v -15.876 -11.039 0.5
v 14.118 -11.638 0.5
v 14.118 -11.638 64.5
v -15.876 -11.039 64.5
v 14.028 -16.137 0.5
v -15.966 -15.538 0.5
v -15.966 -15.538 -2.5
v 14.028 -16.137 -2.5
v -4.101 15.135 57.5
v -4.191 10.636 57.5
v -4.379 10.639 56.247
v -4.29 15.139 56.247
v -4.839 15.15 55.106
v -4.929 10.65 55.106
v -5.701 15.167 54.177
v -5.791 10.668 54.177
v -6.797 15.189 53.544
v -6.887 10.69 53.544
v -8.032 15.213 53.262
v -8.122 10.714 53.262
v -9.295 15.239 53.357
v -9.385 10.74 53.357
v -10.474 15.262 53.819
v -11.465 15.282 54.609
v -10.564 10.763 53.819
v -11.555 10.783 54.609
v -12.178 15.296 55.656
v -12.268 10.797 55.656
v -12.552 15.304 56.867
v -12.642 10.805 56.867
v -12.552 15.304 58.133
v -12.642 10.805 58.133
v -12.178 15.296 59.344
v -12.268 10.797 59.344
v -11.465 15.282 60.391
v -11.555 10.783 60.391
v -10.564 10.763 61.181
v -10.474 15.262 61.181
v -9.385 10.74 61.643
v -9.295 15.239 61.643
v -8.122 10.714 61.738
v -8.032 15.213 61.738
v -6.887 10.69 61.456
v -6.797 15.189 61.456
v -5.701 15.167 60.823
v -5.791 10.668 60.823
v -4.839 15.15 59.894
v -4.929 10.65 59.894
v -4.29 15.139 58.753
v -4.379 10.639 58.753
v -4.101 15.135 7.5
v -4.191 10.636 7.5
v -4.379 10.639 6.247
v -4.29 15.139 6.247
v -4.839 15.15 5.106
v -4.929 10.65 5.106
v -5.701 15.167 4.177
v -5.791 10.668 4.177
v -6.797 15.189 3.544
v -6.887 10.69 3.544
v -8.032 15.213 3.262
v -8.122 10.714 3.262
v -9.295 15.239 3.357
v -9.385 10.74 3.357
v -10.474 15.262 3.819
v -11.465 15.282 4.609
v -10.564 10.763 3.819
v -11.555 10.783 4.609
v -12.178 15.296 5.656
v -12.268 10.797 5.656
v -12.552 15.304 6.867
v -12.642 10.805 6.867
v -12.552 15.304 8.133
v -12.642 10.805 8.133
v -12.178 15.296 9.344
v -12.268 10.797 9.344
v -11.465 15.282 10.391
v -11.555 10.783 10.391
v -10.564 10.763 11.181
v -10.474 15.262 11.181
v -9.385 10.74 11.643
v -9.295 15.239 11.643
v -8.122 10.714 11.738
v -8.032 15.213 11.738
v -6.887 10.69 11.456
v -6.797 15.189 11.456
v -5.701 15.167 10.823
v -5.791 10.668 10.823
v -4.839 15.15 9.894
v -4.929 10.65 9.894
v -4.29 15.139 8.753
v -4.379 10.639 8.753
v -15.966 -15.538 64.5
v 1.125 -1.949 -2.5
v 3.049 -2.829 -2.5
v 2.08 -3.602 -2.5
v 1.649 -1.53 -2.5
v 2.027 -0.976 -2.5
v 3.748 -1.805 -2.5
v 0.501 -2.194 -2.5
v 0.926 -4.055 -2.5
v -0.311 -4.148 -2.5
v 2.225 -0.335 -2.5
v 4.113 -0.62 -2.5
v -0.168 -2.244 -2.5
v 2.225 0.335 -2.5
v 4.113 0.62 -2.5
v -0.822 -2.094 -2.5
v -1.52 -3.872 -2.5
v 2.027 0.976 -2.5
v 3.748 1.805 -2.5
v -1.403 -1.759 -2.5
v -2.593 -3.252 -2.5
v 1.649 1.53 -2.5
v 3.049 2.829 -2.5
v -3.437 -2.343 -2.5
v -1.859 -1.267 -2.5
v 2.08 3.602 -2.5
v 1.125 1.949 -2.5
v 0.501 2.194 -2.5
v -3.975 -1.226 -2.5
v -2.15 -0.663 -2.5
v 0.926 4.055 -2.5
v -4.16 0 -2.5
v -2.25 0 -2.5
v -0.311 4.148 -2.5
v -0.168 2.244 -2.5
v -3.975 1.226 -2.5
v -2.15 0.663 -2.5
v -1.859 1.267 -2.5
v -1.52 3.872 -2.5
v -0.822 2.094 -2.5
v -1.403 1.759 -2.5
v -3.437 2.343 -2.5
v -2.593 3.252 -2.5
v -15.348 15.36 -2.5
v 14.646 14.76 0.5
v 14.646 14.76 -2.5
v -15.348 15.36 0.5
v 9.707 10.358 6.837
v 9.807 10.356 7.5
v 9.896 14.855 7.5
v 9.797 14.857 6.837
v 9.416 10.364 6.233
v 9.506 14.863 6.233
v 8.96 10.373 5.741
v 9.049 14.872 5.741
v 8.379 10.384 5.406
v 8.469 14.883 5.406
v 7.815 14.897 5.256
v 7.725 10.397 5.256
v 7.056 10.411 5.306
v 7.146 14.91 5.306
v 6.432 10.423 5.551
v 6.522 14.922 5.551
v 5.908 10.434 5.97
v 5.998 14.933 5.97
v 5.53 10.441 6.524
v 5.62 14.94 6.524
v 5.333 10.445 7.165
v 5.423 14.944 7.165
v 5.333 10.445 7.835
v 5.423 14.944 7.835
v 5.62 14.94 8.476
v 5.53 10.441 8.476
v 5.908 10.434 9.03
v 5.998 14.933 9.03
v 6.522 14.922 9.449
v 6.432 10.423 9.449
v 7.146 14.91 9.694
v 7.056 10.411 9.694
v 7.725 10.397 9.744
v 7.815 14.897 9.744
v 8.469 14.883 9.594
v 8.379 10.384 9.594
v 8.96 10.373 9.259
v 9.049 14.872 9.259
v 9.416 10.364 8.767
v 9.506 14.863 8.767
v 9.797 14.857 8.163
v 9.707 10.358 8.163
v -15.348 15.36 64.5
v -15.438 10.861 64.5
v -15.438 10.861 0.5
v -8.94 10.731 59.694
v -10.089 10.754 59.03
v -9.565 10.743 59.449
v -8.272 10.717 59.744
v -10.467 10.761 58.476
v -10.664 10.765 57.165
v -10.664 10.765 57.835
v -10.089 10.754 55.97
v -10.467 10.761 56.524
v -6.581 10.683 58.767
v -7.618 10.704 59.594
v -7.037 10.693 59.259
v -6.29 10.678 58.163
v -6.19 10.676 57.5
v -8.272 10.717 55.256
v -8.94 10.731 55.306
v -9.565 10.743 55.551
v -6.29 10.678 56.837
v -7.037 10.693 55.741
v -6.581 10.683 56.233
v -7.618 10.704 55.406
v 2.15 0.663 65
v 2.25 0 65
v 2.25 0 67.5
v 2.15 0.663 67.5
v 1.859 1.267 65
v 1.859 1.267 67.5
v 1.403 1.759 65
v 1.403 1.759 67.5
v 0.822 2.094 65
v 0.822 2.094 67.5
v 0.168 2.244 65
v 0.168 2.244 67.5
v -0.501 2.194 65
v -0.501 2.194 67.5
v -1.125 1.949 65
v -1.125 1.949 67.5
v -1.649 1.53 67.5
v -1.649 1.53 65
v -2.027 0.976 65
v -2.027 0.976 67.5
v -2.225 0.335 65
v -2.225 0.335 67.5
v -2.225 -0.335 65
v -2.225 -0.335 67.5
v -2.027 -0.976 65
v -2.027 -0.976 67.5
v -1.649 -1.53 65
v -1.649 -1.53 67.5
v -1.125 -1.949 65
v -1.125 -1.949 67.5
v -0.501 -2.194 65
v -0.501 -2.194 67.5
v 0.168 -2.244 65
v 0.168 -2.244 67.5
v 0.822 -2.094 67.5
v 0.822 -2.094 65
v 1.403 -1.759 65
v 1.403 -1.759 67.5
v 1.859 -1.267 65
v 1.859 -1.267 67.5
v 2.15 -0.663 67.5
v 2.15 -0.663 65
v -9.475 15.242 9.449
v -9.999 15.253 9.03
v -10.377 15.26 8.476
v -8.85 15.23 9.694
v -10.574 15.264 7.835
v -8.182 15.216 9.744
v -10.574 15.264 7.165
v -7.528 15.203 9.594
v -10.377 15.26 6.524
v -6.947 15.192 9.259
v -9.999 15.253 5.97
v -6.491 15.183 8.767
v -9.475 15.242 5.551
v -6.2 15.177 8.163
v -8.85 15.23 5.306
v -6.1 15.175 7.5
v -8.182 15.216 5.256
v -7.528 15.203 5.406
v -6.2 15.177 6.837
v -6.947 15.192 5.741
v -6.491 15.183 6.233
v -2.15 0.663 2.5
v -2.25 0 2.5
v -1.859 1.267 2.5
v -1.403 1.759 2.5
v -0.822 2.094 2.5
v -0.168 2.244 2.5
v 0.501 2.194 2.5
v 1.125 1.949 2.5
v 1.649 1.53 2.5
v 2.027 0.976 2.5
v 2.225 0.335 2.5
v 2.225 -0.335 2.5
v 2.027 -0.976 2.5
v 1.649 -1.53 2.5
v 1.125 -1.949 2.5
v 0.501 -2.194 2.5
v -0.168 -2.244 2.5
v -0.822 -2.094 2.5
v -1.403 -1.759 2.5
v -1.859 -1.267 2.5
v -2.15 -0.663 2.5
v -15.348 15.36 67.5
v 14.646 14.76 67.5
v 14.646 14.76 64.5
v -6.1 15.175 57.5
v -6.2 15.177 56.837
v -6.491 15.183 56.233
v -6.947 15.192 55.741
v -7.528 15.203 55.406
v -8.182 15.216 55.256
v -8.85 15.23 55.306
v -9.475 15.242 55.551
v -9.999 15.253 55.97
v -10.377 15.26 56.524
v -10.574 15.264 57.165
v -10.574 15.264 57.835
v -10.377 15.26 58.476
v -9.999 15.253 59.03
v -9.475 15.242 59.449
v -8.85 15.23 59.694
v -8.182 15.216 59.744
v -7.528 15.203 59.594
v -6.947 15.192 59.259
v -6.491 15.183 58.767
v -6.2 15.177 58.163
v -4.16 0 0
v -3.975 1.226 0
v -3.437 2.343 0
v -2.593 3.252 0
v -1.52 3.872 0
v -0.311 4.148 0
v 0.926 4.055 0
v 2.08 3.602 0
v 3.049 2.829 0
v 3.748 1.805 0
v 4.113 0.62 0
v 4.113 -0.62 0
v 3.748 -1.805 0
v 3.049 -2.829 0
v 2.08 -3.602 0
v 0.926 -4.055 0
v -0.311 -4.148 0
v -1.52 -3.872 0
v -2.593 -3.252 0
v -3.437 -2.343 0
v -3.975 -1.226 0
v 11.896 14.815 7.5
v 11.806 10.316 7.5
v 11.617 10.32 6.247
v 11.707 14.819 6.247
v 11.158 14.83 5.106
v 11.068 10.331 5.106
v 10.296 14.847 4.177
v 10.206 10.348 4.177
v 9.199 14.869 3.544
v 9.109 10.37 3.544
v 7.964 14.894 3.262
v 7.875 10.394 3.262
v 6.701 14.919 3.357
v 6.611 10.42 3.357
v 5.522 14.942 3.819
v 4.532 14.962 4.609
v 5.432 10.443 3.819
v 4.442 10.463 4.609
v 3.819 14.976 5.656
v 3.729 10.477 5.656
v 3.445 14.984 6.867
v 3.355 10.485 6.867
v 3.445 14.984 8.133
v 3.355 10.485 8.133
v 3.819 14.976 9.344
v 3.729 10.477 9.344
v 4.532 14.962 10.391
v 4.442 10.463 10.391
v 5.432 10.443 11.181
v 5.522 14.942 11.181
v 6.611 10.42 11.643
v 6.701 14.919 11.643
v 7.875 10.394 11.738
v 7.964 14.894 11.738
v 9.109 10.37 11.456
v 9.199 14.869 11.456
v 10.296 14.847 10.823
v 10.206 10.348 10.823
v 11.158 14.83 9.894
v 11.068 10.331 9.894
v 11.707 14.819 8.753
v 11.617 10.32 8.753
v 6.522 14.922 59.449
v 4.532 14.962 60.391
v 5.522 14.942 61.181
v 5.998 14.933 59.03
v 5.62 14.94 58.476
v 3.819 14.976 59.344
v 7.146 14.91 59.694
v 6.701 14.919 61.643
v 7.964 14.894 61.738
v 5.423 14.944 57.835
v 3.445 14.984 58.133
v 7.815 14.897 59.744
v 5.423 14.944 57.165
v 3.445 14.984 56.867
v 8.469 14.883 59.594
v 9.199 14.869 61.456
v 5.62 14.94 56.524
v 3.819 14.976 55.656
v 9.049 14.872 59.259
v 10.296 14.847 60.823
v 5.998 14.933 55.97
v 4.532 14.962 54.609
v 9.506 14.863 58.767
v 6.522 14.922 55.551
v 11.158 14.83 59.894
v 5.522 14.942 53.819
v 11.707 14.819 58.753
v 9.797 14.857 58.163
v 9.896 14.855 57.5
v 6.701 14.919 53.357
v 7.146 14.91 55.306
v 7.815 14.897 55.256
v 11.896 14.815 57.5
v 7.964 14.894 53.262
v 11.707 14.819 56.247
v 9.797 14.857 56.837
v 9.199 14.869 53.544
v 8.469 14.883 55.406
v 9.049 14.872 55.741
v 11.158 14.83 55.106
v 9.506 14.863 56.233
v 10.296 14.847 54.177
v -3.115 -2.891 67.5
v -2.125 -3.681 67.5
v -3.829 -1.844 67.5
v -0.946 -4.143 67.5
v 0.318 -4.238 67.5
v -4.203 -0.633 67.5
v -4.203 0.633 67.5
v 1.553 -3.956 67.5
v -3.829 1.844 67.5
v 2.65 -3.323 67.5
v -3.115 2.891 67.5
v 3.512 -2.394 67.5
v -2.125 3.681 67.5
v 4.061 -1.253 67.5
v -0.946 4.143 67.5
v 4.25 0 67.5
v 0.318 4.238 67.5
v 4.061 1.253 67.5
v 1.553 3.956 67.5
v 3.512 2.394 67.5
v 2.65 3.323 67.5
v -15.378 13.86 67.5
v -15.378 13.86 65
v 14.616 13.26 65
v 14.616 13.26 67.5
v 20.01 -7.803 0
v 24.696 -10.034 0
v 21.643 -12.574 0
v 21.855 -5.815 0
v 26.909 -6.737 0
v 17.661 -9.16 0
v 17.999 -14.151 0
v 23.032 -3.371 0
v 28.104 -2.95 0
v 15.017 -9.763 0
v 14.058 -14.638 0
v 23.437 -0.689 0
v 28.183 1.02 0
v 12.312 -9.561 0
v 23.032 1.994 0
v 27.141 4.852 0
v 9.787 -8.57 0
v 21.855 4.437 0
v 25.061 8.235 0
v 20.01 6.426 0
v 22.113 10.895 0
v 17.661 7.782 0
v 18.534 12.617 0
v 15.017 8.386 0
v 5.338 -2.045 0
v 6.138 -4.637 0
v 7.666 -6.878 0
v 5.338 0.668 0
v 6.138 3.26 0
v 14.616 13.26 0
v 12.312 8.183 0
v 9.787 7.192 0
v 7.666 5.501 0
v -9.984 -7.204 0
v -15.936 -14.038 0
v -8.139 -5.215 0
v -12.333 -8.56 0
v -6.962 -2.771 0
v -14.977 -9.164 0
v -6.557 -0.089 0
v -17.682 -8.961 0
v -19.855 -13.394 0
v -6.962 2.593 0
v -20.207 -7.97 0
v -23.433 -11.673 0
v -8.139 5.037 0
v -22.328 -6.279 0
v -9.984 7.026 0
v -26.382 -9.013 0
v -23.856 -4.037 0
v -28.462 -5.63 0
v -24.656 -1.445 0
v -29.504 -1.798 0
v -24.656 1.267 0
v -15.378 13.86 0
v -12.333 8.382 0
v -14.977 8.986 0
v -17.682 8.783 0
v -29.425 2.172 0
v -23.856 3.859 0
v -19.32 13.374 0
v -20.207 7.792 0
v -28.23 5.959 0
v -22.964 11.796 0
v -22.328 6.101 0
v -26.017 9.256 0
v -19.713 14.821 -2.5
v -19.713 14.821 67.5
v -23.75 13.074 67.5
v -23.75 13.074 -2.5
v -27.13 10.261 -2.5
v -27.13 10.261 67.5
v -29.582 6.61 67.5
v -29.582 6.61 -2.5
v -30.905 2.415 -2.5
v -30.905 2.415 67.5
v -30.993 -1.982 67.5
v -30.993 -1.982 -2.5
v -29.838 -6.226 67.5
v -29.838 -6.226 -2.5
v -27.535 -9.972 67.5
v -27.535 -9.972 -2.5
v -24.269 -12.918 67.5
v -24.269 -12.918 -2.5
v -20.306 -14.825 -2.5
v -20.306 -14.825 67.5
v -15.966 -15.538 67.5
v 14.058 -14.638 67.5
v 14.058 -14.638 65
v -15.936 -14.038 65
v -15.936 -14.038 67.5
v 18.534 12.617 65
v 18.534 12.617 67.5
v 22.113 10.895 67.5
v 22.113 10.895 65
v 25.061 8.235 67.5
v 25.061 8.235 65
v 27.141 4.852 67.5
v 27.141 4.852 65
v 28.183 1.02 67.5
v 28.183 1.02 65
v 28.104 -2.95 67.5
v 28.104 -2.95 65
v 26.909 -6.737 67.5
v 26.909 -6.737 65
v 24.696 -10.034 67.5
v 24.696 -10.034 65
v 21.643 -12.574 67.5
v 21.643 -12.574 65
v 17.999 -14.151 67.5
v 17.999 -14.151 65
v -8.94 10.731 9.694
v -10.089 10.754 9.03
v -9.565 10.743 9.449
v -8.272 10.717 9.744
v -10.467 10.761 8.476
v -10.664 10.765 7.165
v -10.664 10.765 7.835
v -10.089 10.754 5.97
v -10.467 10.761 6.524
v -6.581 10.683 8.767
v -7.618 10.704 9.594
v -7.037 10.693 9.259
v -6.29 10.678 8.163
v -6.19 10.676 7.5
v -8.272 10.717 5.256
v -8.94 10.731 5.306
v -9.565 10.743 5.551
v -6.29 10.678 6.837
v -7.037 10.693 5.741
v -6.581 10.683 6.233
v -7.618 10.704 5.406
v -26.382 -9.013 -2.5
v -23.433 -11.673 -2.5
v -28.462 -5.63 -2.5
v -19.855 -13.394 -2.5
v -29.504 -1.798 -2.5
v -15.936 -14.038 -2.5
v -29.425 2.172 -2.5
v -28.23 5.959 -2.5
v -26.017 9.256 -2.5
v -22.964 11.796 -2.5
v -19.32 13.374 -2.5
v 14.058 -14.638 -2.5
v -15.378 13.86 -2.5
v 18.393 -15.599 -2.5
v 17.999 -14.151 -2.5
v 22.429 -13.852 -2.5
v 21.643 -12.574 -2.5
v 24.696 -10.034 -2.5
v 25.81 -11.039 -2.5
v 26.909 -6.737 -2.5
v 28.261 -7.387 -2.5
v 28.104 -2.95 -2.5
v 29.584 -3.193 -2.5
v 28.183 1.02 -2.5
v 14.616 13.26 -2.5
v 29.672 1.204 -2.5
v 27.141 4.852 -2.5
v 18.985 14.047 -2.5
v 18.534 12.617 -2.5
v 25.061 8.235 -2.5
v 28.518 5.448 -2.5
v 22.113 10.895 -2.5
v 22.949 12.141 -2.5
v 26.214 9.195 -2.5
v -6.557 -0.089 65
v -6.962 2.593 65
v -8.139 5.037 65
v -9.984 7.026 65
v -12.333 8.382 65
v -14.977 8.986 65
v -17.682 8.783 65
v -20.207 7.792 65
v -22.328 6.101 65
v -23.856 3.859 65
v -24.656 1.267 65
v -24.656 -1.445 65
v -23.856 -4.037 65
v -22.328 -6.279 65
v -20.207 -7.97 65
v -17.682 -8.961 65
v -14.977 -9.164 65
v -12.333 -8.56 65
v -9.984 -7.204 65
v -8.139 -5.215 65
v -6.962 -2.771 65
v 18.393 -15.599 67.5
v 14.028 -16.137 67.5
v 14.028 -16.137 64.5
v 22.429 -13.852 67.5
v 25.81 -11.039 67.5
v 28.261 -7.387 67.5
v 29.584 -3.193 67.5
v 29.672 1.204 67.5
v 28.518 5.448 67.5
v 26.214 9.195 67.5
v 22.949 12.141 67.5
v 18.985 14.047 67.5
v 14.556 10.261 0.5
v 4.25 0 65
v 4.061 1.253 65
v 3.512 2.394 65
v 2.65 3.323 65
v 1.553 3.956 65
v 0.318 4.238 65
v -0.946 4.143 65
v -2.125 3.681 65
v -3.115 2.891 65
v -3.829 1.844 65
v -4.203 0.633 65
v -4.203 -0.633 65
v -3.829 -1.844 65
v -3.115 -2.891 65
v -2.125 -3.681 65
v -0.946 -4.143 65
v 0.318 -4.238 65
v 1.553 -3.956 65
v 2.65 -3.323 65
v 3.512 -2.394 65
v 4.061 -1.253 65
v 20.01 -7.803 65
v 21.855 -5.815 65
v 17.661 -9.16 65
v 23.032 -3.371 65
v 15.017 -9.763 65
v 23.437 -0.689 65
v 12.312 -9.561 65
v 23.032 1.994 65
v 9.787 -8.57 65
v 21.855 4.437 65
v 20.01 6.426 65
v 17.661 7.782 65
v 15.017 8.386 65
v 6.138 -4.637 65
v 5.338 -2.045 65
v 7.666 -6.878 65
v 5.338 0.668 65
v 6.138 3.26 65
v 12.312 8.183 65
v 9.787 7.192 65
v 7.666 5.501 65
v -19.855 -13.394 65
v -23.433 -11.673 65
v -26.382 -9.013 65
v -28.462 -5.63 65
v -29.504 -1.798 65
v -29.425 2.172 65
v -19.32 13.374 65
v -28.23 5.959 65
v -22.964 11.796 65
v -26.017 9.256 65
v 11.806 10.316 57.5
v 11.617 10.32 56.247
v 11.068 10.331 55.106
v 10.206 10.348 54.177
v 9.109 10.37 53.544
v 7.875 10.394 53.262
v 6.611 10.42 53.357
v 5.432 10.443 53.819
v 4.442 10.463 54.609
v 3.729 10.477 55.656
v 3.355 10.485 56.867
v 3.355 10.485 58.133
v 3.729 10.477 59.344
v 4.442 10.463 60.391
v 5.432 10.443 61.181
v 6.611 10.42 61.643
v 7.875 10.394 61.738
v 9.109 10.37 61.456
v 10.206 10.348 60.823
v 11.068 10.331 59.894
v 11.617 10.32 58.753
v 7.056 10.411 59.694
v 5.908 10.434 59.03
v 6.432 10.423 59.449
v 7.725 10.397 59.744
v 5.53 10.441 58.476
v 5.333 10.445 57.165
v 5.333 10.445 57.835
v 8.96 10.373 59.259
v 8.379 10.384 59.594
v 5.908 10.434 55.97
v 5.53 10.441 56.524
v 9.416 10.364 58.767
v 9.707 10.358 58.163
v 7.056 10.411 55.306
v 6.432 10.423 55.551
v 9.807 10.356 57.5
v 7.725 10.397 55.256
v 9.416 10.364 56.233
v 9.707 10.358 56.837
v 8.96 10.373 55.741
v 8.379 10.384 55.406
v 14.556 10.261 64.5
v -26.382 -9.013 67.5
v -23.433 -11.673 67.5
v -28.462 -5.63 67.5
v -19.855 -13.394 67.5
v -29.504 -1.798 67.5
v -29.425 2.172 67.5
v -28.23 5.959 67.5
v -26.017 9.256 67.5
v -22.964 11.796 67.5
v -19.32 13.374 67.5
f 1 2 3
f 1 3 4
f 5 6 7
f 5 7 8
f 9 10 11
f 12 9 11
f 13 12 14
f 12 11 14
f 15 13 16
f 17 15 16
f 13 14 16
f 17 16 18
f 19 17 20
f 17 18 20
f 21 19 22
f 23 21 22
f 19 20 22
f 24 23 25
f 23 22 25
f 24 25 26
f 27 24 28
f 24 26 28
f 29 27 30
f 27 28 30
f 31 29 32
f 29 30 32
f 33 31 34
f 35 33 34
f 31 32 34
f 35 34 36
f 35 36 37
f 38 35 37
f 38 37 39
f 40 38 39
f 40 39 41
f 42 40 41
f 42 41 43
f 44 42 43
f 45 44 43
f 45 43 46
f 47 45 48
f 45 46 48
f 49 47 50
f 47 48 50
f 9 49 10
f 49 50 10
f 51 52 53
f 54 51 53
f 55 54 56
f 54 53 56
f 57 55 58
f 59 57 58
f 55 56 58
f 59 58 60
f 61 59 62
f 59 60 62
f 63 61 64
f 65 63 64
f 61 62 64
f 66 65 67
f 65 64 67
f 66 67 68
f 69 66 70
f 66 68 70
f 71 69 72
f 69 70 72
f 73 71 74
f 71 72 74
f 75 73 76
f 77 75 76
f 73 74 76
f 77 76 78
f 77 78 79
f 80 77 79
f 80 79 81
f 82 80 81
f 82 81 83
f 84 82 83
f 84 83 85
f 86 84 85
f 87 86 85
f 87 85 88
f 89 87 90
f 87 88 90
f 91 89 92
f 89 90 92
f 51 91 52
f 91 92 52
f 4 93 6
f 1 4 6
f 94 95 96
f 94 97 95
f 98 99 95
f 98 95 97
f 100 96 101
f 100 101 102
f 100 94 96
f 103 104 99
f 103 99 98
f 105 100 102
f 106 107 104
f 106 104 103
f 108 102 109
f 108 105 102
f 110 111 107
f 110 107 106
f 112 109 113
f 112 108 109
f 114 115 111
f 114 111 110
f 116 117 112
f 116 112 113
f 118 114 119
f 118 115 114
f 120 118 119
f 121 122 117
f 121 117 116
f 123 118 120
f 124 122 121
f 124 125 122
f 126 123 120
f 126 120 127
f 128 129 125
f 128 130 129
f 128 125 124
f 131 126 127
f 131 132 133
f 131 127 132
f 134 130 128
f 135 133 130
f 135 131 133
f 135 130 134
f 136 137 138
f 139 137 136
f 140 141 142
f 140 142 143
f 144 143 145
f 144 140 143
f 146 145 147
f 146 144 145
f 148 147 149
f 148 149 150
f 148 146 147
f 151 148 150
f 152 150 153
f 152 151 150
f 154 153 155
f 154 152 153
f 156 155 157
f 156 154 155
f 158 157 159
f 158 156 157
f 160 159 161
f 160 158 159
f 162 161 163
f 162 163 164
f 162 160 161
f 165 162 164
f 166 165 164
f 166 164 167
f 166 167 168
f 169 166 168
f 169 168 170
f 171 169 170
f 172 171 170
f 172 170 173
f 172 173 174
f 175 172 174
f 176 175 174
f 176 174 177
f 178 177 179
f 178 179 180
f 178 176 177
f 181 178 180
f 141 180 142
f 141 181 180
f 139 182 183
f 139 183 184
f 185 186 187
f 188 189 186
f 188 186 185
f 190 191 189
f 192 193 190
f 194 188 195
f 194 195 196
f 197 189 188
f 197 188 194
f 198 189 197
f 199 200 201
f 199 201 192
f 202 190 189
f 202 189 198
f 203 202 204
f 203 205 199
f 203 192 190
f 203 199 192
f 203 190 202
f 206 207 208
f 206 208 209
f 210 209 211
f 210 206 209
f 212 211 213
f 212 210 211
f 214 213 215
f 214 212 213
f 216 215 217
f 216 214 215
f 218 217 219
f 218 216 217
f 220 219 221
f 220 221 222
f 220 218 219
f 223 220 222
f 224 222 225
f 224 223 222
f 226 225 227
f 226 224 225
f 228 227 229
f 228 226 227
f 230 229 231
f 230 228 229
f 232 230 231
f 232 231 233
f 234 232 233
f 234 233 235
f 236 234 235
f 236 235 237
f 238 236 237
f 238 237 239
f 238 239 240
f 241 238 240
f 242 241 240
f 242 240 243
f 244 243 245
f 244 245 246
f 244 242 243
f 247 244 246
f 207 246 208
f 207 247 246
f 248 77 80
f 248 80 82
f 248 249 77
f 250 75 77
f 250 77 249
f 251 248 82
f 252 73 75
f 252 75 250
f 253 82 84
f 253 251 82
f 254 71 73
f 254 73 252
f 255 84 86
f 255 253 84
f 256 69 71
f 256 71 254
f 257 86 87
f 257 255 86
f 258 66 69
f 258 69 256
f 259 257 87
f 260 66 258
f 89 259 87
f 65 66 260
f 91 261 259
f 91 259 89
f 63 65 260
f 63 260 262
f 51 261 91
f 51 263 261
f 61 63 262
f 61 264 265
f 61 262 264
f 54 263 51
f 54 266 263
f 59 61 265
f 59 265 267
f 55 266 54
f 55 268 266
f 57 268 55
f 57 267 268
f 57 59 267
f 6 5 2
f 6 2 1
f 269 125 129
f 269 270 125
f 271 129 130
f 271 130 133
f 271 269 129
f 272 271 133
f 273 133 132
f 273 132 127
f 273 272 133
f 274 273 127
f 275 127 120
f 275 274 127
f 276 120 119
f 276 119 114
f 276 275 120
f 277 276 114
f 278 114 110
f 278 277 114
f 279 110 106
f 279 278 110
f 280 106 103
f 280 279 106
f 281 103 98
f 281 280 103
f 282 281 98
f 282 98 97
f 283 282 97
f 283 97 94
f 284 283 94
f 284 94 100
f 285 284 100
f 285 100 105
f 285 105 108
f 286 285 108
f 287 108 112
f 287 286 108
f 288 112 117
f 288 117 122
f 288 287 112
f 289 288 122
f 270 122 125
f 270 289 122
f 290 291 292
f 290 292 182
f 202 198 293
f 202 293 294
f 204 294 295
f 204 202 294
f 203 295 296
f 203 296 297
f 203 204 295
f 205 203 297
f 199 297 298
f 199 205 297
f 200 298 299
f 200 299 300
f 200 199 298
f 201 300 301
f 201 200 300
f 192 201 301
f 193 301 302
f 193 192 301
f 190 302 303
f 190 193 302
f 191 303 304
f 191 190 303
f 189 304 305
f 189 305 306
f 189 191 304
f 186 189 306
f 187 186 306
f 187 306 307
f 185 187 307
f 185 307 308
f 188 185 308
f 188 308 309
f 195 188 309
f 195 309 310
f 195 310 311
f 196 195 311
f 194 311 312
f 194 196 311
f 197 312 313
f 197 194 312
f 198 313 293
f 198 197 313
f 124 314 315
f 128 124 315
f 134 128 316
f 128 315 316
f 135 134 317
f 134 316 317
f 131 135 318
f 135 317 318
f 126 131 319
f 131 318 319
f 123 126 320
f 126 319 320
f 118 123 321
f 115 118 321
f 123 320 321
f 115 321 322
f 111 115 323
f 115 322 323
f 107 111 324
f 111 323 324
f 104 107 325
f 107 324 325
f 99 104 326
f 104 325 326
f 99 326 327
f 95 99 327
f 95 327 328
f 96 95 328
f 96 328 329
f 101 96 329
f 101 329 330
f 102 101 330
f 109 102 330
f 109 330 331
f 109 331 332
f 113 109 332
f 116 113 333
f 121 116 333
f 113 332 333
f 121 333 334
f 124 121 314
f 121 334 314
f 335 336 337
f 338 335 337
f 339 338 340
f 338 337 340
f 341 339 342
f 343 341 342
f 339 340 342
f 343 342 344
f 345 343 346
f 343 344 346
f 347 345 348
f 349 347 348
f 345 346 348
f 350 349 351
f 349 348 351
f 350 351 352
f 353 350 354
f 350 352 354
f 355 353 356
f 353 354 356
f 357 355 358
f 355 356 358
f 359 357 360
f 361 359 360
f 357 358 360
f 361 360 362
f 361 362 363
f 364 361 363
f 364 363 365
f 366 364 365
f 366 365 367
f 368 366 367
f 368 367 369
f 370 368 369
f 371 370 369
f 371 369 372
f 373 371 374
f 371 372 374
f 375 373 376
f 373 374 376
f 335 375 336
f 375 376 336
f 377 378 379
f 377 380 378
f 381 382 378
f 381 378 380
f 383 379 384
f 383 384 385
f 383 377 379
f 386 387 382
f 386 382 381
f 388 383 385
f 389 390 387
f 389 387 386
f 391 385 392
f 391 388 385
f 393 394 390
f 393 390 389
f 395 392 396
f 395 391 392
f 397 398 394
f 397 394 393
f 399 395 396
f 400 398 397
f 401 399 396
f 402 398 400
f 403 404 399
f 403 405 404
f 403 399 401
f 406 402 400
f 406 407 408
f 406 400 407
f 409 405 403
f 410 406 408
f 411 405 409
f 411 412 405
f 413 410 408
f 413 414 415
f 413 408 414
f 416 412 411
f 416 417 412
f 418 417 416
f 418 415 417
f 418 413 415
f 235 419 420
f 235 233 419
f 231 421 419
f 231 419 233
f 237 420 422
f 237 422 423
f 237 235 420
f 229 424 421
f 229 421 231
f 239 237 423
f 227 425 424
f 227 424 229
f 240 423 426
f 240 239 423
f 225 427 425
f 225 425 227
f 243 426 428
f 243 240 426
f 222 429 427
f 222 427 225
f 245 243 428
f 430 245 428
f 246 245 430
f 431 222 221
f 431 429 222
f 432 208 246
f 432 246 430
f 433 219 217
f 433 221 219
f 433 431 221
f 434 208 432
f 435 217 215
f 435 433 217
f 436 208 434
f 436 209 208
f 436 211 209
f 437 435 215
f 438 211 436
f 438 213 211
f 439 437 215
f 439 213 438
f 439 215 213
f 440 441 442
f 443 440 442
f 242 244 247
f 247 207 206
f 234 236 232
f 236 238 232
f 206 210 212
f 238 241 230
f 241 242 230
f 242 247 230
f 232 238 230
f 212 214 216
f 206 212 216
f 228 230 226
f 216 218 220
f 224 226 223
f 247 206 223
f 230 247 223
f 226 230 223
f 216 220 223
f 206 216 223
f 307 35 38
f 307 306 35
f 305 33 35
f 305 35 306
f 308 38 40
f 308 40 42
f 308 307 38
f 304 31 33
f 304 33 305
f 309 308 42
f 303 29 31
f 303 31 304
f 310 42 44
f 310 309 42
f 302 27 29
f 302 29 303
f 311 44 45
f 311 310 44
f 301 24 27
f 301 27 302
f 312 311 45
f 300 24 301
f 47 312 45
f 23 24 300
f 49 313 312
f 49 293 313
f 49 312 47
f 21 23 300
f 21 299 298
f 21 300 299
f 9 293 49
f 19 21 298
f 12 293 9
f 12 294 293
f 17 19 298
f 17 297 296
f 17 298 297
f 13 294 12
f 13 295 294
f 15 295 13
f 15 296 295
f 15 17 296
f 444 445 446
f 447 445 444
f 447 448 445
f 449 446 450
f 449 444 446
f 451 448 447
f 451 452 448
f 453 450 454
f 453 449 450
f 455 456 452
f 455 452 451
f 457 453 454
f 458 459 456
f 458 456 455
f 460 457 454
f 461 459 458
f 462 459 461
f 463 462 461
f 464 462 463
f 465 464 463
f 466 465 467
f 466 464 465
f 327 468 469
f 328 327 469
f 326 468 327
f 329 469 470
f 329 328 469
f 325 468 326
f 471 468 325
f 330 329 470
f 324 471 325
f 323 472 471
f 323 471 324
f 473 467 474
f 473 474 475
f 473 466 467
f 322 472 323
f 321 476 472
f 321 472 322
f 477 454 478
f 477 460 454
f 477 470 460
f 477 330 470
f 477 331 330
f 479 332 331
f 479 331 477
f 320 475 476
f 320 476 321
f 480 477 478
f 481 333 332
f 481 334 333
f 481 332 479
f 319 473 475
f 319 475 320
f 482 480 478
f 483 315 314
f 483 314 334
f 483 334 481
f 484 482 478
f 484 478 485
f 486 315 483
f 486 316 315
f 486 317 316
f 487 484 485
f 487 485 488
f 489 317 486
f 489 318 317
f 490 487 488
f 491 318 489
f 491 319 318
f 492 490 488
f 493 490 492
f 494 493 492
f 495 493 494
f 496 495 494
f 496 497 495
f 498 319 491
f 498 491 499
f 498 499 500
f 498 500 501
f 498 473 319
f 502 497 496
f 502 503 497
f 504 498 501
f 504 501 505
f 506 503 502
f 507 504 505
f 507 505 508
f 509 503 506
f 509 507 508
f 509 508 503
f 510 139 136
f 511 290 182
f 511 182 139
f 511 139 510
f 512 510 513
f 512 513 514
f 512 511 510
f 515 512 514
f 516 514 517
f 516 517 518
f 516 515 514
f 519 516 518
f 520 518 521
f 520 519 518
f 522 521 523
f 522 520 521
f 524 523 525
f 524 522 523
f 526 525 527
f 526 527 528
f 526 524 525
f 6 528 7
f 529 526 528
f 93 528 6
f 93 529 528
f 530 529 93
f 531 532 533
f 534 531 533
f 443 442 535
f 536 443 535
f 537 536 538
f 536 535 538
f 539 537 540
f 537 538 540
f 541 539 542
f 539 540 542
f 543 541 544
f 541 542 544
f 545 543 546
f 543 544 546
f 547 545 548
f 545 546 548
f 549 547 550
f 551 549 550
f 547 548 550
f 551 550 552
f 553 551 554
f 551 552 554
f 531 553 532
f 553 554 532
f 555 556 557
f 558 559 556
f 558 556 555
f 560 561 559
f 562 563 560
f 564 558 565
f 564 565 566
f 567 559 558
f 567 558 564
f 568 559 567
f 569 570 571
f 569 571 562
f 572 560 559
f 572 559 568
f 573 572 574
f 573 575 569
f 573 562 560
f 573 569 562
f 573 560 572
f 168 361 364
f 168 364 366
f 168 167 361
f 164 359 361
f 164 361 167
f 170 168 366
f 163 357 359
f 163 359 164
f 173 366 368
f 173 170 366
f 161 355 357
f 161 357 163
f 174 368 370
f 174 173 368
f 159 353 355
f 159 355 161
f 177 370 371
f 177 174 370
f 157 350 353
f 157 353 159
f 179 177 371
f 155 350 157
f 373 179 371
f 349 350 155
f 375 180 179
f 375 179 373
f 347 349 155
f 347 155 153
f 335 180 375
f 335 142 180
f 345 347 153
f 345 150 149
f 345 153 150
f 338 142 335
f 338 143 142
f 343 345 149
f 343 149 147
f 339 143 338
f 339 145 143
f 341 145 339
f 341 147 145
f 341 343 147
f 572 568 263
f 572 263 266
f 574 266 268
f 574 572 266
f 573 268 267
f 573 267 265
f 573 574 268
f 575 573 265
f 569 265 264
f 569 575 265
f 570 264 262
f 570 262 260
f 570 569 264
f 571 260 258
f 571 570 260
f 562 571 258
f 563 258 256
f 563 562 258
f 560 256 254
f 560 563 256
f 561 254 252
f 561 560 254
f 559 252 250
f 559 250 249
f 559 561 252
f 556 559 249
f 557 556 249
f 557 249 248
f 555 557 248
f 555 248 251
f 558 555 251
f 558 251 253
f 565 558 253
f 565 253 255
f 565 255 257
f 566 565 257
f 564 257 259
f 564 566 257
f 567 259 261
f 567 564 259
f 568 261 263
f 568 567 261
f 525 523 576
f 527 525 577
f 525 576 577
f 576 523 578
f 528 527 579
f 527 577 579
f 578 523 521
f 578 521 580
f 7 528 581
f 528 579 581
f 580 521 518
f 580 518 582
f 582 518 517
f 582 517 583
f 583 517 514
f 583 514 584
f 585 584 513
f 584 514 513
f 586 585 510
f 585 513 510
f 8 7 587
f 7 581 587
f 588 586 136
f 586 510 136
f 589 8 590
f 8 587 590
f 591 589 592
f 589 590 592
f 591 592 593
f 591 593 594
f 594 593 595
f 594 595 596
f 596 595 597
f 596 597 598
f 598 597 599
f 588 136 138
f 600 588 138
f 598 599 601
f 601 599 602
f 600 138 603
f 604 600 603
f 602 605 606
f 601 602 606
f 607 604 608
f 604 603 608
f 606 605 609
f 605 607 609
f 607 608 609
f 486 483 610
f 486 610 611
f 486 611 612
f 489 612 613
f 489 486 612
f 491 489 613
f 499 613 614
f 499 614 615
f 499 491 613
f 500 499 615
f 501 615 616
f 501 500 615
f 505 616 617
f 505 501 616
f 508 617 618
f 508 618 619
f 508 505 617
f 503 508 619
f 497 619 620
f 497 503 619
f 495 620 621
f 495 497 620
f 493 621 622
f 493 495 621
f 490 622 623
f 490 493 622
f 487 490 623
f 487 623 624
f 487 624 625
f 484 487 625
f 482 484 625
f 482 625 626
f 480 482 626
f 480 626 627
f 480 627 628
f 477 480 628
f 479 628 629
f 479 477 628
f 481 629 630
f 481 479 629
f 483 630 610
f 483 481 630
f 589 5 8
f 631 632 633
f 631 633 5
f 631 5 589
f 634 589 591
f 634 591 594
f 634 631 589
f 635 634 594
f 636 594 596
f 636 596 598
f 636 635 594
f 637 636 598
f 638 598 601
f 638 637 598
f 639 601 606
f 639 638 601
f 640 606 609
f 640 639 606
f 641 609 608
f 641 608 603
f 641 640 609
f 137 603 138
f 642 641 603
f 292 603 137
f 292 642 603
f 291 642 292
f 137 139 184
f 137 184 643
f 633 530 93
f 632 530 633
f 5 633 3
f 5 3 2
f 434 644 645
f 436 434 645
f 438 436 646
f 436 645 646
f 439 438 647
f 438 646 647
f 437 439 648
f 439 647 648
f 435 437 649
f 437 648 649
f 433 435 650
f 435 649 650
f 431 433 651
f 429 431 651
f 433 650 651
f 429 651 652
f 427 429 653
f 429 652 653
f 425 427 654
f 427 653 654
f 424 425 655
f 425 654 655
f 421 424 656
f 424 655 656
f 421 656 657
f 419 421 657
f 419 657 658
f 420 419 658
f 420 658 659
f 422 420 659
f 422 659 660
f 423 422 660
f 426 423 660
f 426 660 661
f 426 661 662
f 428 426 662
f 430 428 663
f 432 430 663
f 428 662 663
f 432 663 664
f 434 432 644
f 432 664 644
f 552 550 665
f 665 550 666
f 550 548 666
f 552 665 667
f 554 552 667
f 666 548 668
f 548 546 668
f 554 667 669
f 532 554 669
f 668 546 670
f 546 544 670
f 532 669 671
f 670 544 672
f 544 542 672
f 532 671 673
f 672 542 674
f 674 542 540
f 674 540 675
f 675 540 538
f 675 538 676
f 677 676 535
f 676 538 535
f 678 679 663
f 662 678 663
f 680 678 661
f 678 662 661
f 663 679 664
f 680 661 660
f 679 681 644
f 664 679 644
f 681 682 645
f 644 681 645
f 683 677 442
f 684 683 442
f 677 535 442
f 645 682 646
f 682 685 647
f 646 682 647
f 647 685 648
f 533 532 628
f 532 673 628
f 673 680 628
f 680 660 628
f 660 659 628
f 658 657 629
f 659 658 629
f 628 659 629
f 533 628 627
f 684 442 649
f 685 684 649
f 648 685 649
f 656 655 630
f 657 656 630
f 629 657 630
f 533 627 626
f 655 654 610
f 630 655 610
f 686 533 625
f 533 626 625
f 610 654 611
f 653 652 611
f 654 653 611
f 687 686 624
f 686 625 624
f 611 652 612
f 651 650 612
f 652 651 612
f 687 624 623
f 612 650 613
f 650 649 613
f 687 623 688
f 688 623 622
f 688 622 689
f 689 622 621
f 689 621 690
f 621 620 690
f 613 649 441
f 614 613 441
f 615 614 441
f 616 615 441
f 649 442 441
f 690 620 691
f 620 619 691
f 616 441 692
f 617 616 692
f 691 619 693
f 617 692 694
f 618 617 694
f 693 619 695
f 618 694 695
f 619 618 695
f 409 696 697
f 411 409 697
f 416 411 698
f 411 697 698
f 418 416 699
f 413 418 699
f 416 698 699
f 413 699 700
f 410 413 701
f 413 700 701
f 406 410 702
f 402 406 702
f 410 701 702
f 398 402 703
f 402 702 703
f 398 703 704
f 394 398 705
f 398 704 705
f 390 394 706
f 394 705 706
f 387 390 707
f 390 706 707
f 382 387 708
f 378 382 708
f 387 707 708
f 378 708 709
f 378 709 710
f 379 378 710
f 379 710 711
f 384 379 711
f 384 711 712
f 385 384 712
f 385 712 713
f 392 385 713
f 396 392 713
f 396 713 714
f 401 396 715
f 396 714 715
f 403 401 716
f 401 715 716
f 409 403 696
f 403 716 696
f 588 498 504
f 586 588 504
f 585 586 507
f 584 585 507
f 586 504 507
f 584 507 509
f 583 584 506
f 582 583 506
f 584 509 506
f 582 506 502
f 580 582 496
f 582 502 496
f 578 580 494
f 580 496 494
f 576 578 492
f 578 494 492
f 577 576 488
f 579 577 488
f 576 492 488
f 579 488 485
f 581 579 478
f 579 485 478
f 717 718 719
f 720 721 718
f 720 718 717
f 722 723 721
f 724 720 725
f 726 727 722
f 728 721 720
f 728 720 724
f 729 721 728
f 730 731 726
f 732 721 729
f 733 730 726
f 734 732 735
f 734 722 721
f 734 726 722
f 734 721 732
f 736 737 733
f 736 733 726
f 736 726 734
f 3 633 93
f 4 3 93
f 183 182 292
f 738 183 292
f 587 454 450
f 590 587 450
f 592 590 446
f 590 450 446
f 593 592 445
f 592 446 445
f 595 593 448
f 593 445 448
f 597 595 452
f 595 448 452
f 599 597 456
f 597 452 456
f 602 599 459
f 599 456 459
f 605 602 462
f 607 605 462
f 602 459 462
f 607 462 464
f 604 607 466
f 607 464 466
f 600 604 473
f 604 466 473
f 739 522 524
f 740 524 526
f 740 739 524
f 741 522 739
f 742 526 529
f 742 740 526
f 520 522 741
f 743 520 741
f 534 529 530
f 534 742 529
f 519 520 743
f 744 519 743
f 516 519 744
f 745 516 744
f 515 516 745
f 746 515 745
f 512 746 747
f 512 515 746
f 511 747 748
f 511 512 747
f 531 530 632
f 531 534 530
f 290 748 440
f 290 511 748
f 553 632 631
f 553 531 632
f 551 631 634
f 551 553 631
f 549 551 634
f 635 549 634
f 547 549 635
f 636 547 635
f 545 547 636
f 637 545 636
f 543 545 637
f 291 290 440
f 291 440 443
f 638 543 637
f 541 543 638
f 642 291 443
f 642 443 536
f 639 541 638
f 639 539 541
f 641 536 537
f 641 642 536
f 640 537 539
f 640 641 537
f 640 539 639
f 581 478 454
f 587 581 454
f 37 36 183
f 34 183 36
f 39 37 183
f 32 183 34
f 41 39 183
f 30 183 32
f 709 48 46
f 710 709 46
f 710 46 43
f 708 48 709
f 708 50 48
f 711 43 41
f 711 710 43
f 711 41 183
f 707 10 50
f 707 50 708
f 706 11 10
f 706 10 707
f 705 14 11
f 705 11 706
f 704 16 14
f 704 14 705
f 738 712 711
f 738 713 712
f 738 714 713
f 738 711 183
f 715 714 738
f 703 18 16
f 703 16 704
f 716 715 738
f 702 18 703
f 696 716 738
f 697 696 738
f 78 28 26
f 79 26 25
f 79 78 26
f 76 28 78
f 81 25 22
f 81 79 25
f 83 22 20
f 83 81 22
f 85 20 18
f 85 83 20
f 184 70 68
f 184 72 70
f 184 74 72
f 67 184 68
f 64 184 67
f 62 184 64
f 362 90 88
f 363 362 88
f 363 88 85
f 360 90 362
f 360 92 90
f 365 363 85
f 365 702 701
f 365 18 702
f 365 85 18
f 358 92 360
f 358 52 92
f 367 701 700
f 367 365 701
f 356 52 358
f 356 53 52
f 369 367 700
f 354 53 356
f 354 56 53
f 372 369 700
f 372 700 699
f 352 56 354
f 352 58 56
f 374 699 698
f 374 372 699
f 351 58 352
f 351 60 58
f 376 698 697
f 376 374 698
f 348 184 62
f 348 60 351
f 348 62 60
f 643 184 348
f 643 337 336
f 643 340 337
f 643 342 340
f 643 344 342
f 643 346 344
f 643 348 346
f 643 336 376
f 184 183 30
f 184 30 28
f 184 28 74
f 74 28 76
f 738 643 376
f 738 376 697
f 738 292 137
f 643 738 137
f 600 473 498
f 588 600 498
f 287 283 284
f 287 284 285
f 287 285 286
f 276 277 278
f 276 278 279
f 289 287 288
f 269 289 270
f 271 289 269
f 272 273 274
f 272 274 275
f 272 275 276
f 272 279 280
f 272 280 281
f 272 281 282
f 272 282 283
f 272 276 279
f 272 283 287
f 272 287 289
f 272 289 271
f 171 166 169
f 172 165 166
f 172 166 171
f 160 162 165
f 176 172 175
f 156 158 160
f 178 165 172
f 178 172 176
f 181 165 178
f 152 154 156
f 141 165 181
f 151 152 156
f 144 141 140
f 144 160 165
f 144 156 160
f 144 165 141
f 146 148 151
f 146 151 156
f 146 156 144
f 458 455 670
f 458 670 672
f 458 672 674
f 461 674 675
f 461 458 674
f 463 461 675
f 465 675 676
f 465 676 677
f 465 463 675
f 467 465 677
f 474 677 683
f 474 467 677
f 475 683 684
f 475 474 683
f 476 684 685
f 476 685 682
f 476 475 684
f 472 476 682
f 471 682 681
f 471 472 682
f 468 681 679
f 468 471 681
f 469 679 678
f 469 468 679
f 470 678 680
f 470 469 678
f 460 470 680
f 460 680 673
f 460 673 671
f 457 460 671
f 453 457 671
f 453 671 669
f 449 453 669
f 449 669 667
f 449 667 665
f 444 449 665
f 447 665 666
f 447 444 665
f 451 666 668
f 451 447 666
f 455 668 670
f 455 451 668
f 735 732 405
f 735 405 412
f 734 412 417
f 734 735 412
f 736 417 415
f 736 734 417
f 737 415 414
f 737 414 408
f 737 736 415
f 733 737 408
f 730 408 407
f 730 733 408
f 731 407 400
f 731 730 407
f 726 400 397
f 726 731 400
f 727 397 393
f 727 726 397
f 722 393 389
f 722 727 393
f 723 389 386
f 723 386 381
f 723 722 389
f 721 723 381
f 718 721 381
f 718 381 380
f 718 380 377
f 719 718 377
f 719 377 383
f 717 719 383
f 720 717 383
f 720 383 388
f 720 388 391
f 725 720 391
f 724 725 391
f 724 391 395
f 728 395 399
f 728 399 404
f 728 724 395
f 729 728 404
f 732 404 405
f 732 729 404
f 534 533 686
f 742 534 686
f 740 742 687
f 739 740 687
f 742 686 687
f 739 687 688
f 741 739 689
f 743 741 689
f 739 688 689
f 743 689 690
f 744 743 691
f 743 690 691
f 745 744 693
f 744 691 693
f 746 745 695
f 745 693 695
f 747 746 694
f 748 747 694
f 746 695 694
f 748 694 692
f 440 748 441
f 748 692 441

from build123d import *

# Parameters (mm, degrees)
SKETCH_1_R          = 9.1
EXTRUDE_1_DEPTH     = 65
EXTRUDE_2_DEPTH     = 2.5
EXTRUDE_3_DEPTH     = 2.5
SKETCH_7_W          = 30
SKETCH_7_H          = 64
CUT_EXTRUDE_4_DEPTH = 4.5
SKETCH_8_W          = 30
SKETCH_8_H          = 64
CUT_EXTRUDE_5_DEPTH = 4.5
SKETCH_4_R          = 4.159545235
SKETCH_4_R_2        = 2.25
EXTRUDE_4_DEPTH     = 2.5
SKETCH_10_R         = 2.25
CUT_EXTRUDE_6_DEPTH = 2.5
SKETCH_11_R         = 4.25
SKETCH_11_R_2       = 2.25
EXTRUDE_5_DEPTH     = 4.5
SKETCH_3_R          = 4.25
SKETCH_3_R_2        = 2.25
EXTRUDE_6_DEPTH     = 2.5


with BuildPart() as part:
    # Эскиз1 → Бобышка-Вытянуть1 (new body)
    with BuildSketch(Plane.XY):
        with BuildLine():
            Line((-15.348477888, 15.359663741), (14.645527362, 14.759956259))
            ThreePointArc((14.645527362, 14.759956259), (29.785323334, -0.997609119), (14.027757956, -16.137405091))
            Line((14.027757956, -16.137405091), (-15.966247294, -15.537697609))
            ThreePointArc((-15.966247294, -15.537697609), (-31.106043266, 0.219867769), (-15.348477888, 15.359663741))
        make_face()
        with Locations((-15.657362591, -0.089016934)):
            Circle(SKETCH_1_R, mode=Mode.SUBTRACT)
        with Locations((14.336642659, -0.688724416)):
            Circle(SKETCH_1_R, mode=Mode.SUBTRACT)
    extrude(amount=EXTRUDE_1_DEPTH)

    # Эскиз2 → Бобышка-Вытянуть2 (add)
    with BuildSketch(Plane.XY.offset(65)):
        with BuildLine():
            Line((-15.966247294, -15.537697609), (14.027757956, -16.137405091))
            ThreePointArc((14.027757956, -16.137405091), (29.785323334, -0.997609119), (14.645527362, 14.759956259))
            Line((14.645527362, 14.759956259), (-15.348477888, 15.359663741))
            ThreePointArc((-15.348477888, 15.359663741), (-31.106043266, 0.219867769), (-15.966247294, -15.537697609))
        make_face()
        with BuildLine():
            Line((-15.378463262, 13.859963479), (14.615541988, 13.260255996))
            ThreePointArc((14.615541988, 13.260255996), (28.285623072, -0.967623745), (14.05774333, -14.637704829))
            Line((14.05774333, -14.637704829), (-15.93626192, -14.037997346))
            ThreePointArc((-15.93626192, -14.037997346), (-29.606343003, 0.189882395), (-15.378463262, 13.859963479))
        make_face(mode=Mode.SUBTRACT)
    extrude(amount=EXTRUDE_2_DEPTH)

    # Эскиз5 → Бобышка-Вытянуть3 (add)
    with BuildSketch(Plane(origin=(0, 0, 0), x_dir=(-1, 0, 0), z_dir=(0, 0, -1))):
        with BuildLine():
            Line((15.966247294, -15.537697609), (-14.027757956, -16.137405091))
            ThreePointArc((-14.027757956, -16.137405091), (-29.785323334, -0.997609119), (-14.645527362, 14.759956259))
            Line((-14.645527362, 14.759956259), (15.348477888, 15.359663741))
            ThreePointArc((15.348477888, 15.359663741), (31.106043266, 0.219867769), (15.966247294, -15.537697609))
        make_face()
        with BuildLine():
            Line((-14.615541988, 13.260255996), (15.378463262, 13.859963479))
            ThreePointArc((15.378463262, 13.859963479), (29.606343003, 0.189882395), (15.93626192, -14.037997346))
            Line((15.93626192, -14.037997346), (-14.05774333, -14.637704829))
            ThreePointArc((-14.05774333, -14.637704829), (-28.285623072, -0.967623745), (-14.615541988, 13.260255996))
        make_face(mode=Mode.SUBTRACT)
    extrude(amount=EXTRUDE_3_DEPTH)

    # Эскиз7 → Вырез-Вытянуть4 (cut)
    with BuildSketch(Plane(origin=(0.300848748, 15.046767274, 0), x_dir=(0.999800175, -0.019990249, 0), z_dir=(0.019990249, 0.999800175, 0))):
        with Locations((-0.652454388, -32.5)):
            Rectangle(SKETCH_7_W, SKETCH_7_H)
    extrude(amount=-CUT_EXTRUDE_4_DEPTH, mode=Mode.SUBTRACT)

    # Эскиз8 → Вырез-Вытянуть5 (cut)
    with BuildSketch(Plane(origin=(-0.316920658, -15.850594076, 0), x_dir=(-0.999800175, 0.019990249, 0), z_dir=(-0.019990249, -0.999800175, 0))):
        with Locations((0.652454388, -32.5)):
            Rectangle(SKETCH_8_W, SKETCH_8_H)
    extrude(amount=-CUT_EXTRUDE_5_DEPTH, mode=Mode.SUBTRACT)

    # Эскиз4 → Бобышка-Вытянуть4 (add)
    with BuildSketch(Plane(origin=(0, 0, 0), x_dir=(-1, 0, 0), z_dir=(0, 0, -1))):
        Circle(SKETCH_4_R)
        Circle(SKETCH_4_R_2, mode=Mode.SUBTRACT)
    extrude(amount=EXTRUDE_4_DEPTH)

    # Эскиз10 → Вырез-Вытянуть6 (cut)
    with BuildSketch(Plane(origin=(0, 0, 0), x_dir=(-1, 0, 0), z_dir=(0, 0, -1))):
        Circle(SKETCH_10_R)
    extrude(amount=-CUT_EXTRUDE_6_DEPTH, mode=Mode.SUBTRACT)

    # Эскиз11 → Бобышка-Вытянуть5 (add)
    with BuildSketch(Plane(origin=(0.210892625, 10.547666486, 0), x_dir=(0.999800175, -0.019990249, 0), z_dir=(0.019990249, 0.999800175, 0))):
        with Locations((7.347545612, -7.5)):
            Circle(SKETCH_11_R)
        with Locations((7.347545612, -7.5)):
            Circle(SKETCH_11_R_2, mode=Mode.SUBTRACT)
        with Locations((-8.652454388, -7.5)):
            Circle(SKETCH_11_R)
        with Locations((-8.652454388, -7.5)):
            Circle(SKETCH_11_R_2, mode=Mode.SUBTRACT)
        with Locations((7.347545612, -57.5)):
            Circle(SKETCH_11_R)
        with Locations((7.347545612, -57.5)):
            Circle(SKETCH_11_R_2, mode=Mode.SUBTRACT)
        with Locations((-8.652454388, -57.5)):
            Circle(SKETCH_11_R)
        with Locations((-8.652454388, -57.5)):
            Circle(SKETCH_11_R_2, mode=Mode.SUBTRACT)
    extrude(amount=EXTRUDE_5_DEPTH)

    # Эскиз3 → Бобышка-Вытянуть6 (add)
    with BuildSketch(Plane.XY.offset(65)):
        Circle(SKETCH_3_R)
        Circle(SKETCH_3_R_2, mode=Mode.SUBTRACT)
    extrude(amount=EXTRUDE_6_DEPTH)


solid = part.part
